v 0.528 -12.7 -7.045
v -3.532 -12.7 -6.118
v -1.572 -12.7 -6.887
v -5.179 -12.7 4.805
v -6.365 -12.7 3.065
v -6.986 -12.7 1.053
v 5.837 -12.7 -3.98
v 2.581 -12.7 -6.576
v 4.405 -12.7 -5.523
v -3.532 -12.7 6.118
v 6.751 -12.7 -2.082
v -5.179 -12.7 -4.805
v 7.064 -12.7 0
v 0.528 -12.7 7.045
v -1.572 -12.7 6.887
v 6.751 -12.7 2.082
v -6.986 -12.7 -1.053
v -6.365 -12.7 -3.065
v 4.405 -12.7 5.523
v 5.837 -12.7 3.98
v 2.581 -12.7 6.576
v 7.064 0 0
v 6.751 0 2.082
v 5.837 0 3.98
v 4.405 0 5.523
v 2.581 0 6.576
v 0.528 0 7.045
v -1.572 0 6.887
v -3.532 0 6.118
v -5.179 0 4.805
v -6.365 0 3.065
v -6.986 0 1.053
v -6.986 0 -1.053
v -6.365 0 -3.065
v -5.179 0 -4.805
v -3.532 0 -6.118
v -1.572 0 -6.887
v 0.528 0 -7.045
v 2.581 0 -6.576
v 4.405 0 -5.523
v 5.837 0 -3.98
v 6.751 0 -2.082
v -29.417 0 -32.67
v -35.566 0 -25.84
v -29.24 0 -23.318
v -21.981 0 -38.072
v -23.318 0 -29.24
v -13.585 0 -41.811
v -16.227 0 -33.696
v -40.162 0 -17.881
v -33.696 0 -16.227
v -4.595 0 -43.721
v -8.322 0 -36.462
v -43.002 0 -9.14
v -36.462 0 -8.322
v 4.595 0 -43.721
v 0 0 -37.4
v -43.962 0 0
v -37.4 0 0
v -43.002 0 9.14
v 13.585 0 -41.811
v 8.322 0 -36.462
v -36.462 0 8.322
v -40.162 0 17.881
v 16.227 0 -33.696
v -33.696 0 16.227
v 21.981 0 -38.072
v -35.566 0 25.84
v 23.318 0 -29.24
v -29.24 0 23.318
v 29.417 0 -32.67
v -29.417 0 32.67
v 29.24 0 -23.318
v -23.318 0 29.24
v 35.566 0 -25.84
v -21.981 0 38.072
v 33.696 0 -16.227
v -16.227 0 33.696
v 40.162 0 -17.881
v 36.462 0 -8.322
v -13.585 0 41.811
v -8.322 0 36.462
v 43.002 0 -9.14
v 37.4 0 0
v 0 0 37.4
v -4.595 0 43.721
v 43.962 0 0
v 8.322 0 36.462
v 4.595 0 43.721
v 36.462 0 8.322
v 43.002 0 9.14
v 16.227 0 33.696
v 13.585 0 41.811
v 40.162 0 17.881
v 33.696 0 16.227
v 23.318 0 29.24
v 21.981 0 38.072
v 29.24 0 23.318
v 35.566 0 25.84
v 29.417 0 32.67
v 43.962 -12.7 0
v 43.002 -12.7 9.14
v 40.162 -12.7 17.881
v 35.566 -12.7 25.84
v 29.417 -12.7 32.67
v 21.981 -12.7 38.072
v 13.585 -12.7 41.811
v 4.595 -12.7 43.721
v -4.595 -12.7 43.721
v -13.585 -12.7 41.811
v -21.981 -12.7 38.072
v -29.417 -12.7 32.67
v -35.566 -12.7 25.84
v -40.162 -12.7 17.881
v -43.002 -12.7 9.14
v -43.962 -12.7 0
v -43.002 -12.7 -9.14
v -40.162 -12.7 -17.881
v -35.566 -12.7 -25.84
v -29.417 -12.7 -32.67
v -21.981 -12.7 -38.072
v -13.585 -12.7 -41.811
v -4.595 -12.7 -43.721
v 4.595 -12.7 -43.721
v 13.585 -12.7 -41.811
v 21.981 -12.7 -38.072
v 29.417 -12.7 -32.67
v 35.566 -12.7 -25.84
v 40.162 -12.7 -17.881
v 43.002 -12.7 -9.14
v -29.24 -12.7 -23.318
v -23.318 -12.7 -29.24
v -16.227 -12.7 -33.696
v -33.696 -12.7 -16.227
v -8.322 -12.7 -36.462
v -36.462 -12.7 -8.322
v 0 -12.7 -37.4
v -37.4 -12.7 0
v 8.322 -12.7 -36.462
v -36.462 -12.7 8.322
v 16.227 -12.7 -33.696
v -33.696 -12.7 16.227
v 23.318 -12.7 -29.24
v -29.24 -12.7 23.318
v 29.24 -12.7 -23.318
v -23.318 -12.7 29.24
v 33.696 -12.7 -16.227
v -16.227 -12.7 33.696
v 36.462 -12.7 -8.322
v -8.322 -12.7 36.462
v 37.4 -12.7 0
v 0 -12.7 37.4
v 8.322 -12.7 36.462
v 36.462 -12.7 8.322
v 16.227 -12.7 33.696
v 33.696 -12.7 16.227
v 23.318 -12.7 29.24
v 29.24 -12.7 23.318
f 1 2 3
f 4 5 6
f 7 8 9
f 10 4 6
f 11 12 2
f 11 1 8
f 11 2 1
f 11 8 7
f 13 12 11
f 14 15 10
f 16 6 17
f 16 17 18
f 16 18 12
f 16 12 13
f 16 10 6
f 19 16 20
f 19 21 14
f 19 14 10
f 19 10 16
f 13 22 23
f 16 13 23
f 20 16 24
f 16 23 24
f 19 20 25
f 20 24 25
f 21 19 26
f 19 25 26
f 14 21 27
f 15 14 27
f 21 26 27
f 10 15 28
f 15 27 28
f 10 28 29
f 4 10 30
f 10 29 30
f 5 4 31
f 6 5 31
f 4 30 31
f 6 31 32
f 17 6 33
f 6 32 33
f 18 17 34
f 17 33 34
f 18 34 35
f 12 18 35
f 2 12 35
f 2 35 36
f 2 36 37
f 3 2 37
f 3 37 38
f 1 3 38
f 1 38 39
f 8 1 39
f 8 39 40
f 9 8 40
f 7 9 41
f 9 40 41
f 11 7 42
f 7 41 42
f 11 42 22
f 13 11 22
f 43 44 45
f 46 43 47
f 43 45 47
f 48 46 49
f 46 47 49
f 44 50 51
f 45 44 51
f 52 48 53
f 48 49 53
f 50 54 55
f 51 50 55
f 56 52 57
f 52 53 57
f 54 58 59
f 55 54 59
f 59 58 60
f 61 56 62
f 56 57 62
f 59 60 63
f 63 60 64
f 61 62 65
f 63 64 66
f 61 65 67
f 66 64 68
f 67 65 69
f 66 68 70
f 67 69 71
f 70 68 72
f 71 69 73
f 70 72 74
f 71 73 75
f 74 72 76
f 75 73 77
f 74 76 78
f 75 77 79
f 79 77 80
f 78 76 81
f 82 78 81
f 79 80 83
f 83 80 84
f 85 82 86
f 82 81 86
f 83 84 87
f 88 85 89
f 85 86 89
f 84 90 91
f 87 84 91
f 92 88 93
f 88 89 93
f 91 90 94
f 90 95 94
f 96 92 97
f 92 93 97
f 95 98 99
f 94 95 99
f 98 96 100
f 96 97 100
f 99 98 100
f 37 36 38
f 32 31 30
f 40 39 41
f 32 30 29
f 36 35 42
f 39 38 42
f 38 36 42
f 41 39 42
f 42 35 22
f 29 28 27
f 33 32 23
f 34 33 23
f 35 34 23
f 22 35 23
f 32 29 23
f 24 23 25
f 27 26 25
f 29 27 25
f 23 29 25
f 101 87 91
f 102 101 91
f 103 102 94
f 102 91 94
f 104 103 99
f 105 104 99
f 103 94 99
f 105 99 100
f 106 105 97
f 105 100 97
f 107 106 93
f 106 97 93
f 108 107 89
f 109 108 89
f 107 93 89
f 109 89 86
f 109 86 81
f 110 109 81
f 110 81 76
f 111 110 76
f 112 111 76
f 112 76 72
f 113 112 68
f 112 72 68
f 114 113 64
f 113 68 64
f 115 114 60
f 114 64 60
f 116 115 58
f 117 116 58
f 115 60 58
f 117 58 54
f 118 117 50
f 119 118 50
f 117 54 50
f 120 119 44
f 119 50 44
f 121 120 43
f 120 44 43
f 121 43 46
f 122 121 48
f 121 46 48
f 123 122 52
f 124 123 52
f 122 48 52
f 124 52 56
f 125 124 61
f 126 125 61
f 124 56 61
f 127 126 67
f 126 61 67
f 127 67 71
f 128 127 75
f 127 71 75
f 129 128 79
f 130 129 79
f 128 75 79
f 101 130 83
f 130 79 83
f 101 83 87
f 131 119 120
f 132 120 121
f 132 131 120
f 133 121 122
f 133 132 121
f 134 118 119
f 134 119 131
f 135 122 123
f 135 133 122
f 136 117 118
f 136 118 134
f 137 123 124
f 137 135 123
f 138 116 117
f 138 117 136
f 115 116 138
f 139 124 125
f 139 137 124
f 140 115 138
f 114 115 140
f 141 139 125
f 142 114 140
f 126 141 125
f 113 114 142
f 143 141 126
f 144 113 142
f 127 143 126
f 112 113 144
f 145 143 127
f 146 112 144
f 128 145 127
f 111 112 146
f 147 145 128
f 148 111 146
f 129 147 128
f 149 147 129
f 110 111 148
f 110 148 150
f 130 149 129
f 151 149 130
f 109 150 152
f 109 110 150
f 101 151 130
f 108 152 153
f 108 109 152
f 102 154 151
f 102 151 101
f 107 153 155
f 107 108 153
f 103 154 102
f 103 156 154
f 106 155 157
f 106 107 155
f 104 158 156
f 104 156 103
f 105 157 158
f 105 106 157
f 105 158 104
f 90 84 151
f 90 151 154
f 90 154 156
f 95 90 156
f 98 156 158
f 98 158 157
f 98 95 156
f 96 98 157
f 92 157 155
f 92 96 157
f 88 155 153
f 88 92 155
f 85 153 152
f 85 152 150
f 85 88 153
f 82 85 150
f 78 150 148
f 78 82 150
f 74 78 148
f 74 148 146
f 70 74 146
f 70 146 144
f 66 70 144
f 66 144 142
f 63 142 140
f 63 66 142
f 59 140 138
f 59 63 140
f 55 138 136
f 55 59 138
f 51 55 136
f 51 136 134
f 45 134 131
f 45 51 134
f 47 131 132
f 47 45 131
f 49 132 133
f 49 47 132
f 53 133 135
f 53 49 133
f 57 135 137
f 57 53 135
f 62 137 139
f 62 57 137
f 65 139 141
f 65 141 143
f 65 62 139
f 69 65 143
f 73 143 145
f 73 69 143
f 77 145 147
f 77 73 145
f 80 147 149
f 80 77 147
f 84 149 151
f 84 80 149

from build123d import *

# Parameters (mm, degrees)
F0_R     = 43.96227
F0_R_2   = 37.399802
F1_DEPTH = 12.7
F2_R     = 7.064445
F3_DEPTH = 12.7


with BuildPart() as f1:
    # F0 (on Front) → F1 (new body)
    with BuildSketch(Plane.XZ):
        Circle(F0_R)
        Circle(F0_R_2, mode=Mode.SUBTRACT)
    extrude(amount=F1_DEPTH)


with BuildPart() as f3:
    # F2 (on Front) → F3 (new body)
    with BuildSketch(Plane.XZ):
        Circle(F2_R)
    extrude(amount=F3_DEPTH)


solid = Compound([f1.part, f3.part])
